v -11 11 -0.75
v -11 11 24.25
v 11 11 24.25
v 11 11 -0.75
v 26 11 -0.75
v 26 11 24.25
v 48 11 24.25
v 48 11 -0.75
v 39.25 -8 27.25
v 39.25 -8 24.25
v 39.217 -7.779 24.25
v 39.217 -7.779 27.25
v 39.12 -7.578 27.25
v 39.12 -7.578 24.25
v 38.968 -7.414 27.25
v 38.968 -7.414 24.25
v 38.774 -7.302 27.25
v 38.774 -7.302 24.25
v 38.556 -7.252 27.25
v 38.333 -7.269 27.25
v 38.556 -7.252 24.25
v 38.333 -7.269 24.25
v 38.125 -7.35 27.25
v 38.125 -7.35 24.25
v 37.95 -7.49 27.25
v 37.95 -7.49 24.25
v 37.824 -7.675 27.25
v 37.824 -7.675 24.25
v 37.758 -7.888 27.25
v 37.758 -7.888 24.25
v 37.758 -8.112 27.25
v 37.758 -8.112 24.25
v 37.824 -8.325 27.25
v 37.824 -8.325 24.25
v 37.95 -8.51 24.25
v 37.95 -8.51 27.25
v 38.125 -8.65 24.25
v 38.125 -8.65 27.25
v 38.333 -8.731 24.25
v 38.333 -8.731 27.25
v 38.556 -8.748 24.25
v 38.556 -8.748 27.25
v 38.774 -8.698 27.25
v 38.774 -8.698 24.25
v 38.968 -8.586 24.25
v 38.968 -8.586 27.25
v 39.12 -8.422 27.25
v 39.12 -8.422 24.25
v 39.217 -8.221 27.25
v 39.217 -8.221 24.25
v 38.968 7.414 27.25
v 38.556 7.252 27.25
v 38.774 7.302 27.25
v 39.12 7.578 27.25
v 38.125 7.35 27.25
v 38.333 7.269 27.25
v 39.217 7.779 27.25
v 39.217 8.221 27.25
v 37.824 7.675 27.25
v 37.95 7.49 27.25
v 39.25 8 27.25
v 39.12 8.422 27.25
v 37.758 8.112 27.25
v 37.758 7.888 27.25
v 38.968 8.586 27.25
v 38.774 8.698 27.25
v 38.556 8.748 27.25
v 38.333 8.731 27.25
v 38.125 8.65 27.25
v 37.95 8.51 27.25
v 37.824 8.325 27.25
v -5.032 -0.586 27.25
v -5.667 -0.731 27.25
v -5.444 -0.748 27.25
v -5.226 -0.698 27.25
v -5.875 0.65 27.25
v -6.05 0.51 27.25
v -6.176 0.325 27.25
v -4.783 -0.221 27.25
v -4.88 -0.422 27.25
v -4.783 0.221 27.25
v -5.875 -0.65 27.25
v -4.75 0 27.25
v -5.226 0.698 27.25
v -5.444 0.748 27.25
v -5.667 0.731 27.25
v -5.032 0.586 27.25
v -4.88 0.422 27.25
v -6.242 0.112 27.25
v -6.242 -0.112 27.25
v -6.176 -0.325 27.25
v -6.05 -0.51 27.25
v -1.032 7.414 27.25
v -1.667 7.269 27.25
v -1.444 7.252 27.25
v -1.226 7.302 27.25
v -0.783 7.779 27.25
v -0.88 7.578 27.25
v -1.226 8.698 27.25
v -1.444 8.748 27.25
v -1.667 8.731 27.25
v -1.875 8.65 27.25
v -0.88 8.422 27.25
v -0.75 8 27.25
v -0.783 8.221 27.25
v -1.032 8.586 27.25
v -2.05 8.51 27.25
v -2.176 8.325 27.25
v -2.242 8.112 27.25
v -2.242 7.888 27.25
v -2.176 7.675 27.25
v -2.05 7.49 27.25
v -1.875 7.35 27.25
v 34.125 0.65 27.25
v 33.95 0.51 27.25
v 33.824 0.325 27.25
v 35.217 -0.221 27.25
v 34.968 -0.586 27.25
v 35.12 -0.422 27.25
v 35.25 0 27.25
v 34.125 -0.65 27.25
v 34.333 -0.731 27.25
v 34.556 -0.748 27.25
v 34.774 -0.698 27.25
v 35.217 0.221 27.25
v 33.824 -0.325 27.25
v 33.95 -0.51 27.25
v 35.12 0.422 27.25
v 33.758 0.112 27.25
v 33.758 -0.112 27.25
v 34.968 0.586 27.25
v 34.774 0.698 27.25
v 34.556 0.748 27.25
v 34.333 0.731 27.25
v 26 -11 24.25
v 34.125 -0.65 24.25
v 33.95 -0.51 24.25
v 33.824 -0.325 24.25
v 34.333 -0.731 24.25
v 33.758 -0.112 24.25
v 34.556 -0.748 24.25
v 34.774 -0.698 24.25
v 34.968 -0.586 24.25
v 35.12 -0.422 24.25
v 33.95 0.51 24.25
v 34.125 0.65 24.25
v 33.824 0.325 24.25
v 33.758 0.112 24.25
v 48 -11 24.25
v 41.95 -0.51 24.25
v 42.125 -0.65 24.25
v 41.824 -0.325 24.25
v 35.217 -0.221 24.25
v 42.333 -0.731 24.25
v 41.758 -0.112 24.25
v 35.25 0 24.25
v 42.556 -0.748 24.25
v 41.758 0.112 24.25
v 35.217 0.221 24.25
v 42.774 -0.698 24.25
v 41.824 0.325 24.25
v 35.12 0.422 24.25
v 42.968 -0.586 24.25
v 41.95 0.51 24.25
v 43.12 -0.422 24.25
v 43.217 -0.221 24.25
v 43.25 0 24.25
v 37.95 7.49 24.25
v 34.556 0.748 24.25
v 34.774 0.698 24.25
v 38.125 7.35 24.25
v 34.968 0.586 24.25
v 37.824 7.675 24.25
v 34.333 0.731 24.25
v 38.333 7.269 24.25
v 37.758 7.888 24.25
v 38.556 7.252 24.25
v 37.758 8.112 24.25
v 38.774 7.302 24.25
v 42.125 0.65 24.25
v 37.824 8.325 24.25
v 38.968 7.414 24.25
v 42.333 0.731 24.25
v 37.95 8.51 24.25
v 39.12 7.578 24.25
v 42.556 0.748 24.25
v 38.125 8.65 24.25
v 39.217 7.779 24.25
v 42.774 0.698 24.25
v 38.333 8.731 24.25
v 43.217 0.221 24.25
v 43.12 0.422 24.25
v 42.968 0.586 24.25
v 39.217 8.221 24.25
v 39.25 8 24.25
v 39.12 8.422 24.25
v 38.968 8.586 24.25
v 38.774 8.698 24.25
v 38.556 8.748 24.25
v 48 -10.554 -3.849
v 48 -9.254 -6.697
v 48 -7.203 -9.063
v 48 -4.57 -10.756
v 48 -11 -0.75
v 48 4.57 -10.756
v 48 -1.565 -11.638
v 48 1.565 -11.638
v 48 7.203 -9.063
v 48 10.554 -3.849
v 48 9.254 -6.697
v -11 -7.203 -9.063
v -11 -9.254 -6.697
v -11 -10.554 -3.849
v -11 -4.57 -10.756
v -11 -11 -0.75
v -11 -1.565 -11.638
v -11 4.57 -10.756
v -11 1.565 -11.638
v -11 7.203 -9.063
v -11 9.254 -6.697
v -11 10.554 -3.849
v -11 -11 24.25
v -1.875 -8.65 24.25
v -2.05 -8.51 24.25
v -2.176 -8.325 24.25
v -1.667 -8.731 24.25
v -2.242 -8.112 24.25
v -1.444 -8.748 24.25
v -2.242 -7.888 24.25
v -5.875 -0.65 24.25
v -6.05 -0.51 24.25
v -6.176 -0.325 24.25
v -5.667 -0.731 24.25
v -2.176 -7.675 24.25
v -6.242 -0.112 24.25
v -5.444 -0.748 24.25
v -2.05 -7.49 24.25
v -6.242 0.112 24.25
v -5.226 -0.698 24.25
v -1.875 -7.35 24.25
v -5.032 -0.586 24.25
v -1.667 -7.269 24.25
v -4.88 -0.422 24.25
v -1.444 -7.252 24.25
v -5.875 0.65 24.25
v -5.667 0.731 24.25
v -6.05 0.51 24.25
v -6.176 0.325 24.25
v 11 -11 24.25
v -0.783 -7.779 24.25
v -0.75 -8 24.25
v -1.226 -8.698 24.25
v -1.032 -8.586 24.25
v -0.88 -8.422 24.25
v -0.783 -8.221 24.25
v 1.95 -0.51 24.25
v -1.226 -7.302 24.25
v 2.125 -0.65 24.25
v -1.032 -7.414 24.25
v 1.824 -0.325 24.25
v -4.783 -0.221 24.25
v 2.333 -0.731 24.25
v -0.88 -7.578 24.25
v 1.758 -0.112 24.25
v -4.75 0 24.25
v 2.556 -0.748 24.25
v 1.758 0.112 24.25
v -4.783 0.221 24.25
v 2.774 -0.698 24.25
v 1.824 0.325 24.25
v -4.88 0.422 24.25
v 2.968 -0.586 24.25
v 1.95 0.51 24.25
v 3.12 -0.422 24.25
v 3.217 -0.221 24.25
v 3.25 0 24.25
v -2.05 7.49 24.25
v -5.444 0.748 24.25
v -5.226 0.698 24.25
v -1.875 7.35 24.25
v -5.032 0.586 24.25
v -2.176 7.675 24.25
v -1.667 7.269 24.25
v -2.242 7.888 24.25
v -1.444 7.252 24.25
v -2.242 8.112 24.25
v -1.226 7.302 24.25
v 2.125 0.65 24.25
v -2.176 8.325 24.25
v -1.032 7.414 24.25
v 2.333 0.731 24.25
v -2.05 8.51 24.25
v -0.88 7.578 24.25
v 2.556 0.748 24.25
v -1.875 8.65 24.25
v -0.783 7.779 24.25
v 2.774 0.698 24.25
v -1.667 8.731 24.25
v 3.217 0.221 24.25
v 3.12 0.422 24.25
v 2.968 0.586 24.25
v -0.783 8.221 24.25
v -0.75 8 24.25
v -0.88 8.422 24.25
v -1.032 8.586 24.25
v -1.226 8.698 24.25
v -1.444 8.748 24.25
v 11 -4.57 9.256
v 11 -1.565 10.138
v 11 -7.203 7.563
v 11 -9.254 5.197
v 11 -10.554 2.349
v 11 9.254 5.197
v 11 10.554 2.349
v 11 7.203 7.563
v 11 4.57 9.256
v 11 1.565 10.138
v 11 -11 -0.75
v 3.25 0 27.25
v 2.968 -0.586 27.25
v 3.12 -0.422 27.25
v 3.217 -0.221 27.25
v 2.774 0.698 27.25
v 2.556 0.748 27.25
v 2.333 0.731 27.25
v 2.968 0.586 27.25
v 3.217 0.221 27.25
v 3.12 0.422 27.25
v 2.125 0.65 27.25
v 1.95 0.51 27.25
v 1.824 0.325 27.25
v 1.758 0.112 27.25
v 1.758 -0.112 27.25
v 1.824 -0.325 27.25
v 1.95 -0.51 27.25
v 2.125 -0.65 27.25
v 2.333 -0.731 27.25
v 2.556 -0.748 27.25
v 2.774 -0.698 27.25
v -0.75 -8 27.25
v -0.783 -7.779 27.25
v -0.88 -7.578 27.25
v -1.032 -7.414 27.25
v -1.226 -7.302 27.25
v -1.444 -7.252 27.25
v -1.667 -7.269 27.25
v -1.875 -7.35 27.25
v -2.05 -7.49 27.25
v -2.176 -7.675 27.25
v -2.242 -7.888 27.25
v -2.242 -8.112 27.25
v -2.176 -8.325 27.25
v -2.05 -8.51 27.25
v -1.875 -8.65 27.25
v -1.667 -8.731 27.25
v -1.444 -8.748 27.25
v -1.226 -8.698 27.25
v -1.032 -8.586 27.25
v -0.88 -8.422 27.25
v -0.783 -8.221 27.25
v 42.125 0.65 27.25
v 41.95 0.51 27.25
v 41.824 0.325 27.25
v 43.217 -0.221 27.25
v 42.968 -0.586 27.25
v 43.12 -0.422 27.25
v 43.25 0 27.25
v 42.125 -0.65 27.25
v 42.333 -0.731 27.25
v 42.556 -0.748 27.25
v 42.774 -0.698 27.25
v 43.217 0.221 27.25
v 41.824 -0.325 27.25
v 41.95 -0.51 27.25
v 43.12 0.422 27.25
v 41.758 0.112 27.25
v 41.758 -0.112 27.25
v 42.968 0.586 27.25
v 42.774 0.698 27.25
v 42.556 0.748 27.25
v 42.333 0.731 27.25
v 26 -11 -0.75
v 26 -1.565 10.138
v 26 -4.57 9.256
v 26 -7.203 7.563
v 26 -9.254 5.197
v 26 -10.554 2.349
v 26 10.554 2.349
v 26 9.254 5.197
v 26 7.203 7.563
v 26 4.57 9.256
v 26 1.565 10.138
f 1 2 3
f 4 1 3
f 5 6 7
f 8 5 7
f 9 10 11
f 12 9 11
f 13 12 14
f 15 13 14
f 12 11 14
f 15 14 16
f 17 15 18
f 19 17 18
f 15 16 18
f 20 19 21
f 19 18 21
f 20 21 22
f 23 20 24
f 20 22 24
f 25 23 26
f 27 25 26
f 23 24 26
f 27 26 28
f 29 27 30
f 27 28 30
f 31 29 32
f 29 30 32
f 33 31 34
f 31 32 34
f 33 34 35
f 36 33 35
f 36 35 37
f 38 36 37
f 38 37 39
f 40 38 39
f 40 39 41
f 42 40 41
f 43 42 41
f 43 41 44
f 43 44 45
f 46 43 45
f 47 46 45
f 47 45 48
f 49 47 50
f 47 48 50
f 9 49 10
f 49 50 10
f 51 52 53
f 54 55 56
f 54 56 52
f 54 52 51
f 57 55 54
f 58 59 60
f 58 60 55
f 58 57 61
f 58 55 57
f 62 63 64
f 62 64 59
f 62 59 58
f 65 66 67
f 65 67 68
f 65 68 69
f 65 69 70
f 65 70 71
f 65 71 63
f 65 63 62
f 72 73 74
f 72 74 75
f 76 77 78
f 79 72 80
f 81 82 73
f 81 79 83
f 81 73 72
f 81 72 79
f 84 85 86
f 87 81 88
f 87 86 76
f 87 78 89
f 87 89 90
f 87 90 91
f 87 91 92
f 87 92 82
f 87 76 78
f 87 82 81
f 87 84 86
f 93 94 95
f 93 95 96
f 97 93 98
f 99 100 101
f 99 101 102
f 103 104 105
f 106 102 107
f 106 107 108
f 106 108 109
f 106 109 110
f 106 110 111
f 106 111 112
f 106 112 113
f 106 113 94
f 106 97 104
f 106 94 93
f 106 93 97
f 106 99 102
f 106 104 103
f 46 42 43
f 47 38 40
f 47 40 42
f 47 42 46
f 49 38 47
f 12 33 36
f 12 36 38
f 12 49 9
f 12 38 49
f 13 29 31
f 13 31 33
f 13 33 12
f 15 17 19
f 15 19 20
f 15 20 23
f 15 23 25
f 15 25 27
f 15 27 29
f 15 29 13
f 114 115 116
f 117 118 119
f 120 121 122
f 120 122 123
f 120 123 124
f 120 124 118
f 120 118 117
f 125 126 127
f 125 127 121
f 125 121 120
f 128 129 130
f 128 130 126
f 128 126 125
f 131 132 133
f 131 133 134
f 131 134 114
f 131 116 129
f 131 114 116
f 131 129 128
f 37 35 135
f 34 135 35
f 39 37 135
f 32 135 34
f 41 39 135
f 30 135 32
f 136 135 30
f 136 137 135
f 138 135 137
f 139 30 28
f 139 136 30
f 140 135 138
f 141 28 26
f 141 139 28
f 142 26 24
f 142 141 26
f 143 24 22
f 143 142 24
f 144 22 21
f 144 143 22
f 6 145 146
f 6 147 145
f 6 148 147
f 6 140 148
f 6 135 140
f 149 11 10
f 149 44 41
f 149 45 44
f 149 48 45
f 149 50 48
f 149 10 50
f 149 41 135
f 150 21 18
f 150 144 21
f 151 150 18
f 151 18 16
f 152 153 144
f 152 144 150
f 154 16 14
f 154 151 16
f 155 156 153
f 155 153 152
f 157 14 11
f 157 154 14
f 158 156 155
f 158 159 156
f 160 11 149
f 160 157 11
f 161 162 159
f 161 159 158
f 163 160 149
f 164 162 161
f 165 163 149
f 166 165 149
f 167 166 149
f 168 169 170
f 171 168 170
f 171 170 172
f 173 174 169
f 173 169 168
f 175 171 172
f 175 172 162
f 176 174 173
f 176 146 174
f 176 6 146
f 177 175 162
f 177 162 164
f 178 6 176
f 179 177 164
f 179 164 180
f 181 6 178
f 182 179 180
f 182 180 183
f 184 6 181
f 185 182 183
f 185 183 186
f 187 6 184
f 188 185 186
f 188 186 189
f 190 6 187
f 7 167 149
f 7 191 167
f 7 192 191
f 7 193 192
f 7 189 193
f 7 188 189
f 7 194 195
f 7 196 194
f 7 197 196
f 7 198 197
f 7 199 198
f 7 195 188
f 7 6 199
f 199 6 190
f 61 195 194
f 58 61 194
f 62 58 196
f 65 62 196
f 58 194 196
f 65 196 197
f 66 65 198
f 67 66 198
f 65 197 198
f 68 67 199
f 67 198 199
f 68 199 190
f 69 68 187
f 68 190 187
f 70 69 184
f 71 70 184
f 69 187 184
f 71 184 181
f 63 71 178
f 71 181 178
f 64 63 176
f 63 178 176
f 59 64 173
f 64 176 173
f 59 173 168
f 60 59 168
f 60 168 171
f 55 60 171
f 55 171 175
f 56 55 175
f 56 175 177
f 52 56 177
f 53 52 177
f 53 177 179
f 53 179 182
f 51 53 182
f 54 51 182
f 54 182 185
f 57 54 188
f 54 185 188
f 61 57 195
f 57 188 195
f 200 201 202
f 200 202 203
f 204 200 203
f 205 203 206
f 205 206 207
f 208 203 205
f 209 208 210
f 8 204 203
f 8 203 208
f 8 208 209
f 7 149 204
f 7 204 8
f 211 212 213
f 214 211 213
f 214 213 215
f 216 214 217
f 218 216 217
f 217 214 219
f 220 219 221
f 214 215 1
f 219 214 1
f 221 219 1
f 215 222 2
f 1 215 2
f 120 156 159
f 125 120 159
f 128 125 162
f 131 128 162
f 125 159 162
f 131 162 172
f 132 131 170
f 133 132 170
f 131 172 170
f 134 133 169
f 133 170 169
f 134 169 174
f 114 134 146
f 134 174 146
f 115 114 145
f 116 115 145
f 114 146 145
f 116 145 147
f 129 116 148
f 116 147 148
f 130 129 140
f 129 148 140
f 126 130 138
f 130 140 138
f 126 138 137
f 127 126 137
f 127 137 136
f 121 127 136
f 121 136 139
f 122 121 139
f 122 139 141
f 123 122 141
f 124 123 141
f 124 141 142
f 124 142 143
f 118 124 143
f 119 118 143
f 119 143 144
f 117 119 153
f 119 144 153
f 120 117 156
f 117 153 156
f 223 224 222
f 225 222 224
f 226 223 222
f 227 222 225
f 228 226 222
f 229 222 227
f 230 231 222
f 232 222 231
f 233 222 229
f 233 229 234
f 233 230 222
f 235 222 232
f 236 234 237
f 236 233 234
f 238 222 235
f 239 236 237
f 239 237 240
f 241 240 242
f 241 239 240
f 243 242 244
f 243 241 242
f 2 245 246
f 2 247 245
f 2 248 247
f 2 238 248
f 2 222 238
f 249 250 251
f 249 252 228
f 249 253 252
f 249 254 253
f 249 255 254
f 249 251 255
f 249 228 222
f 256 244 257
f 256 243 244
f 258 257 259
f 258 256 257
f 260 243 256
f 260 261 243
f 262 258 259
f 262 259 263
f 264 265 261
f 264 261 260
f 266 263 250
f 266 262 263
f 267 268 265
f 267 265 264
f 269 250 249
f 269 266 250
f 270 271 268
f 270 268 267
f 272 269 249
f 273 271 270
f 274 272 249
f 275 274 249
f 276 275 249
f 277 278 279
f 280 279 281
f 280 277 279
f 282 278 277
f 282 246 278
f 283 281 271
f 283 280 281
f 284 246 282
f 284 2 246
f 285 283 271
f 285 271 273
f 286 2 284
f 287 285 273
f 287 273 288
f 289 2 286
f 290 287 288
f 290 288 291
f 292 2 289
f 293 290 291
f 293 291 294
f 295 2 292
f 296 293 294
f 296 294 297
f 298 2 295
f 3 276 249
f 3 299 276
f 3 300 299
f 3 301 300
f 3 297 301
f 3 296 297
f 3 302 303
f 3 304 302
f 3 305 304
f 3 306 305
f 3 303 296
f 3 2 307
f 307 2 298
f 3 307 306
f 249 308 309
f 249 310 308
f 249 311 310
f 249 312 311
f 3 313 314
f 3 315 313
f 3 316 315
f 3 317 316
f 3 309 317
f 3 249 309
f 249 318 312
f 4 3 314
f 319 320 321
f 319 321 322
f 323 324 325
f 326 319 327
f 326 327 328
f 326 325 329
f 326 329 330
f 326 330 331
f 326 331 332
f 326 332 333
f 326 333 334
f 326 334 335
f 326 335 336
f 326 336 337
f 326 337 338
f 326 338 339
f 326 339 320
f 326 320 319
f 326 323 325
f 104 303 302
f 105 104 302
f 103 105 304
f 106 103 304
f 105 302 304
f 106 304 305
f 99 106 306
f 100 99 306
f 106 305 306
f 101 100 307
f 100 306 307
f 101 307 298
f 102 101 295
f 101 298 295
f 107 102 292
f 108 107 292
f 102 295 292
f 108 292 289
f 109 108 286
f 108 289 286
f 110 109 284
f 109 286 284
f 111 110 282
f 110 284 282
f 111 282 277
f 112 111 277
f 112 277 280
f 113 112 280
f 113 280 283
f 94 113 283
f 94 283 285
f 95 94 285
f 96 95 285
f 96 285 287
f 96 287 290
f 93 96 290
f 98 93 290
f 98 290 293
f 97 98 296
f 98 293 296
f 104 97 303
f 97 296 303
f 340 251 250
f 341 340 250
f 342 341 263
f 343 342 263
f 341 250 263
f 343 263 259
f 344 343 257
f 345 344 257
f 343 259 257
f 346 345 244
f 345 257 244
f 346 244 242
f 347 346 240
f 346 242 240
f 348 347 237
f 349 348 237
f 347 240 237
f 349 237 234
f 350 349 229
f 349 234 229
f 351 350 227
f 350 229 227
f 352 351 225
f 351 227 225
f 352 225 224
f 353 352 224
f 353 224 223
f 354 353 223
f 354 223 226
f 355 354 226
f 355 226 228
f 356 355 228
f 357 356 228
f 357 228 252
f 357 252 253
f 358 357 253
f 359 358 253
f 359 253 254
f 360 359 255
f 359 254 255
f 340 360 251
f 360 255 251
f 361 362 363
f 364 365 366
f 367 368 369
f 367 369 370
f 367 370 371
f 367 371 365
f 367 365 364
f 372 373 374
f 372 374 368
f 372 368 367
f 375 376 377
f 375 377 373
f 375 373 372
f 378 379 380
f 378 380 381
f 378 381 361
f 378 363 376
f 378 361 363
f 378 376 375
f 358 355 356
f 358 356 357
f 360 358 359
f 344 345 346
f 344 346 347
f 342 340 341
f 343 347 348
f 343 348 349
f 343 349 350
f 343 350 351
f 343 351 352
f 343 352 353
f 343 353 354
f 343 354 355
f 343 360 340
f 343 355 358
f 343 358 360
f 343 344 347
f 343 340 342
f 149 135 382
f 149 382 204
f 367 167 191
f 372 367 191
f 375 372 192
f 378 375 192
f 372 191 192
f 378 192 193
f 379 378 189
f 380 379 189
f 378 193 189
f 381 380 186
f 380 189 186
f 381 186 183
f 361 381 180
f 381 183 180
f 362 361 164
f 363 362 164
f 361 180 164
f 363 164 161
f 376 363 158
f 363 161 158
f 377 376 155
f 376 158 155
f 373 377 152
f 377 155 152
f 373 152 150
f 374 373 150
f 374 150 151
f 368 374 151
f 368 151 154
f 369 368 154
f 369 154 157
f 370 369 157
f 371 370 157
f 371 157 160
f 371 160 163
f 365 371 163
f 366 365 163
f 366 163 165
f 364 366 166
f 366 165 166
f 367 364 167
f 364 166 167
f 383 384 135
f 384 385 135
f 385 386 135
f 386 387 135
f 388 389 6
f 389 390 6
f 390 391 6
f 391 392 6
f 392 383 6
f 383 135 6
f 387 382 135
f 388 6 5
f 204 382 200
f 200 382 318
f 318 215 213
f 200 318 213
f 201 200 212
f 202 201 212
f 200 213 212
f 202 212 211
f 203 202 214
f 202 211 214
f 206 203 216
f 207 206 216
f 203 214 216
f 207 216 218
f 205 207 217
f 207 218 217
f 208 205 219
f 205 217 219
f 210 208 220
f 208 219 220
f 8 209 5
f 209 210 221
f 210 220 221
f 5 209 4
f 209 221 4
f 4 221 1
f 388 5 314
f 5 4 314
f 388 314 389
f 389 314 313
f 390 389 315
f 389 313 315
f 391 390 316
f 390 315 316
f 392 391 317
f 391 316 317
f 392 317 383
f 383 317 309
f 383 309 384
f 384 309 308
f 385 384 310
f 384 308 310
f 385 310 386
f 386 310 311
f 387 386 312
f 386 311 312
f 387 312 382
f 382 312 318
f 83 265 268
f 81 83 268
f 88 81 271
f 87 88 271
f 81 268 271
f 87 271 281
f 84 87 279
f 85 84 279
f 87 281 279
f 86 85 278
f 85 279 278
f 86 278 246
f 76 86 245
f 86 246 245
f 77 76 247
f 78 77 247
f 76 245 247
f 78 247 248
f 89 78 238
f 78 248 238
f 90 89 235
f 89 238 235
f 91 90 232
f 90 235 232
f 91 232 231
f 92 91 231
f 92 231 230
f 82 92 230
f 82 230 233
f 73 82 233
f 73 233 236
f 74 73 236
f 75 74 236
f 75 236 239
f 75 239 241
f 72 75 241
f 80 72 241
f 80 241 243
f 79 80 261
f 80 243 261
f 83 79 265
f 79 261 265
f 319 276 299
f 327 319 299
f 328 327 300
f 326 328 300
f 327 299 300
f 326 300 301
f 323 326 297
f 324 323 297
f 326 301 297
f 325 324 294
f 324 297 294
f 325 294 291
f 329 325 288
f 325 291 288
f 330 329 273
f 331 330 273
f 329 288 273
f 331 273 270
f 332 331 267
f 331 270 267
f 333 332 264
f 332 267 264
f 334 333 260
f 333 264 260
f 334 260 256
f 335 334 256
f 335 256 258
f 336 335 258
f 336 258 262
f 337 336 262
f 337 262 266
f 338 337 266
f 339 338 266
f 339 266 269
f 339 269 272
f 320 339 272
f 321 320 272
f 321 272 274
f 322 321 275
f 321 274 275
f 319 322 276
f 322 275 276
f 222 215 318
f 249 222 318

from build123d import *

# Parameters (mm, degrees)
ESBO_O1_W                  = 22
ESBO_O1_H                  = 22
RESSALTO_EXTRUS_O1_DEPTH   = 24.25
RESSALTO_EXTRUS_O1_2_DEPTH = 24.25
ESBO_O2_R                  = 11
RESSALTO_EXTRUS_O2_DEPTH   = 15
CORTE_EXTRUS_O1_DEPTH      = 65.730692102
CORTE_EXTRUS_O1_DEPTH_BACK = 65.730692102
ESBO_O4_R                  = 0.75
RESSALTO_EXTRUS_O3_DEPTH   = 3


with BuildPart() as part:
    # Esboço1 → Ressalto-extrusão1 (new, symmetric)
    with BuildSketch(Plane.XY):
        Rectangle(ESBO_O1_W, ESBO_O1_H)
    extrude(amount=RESSALTO_EXTRUS_O1_DEPTH, both=True)



with BuildPart() as body_2:
    # Esboço1 → Ressalto-extrus_o1 2 (new, symmetric)
    with BuildSketch(Plane.XY):
        with Locations((37, 0)):
            Rectangle(ESBO_O1_W, ESBO_O1_H)
    extrude(amount=RESSALTO_EXTRUS_O1_2_DEPTH, both=True)


with BuildPart() as part_1:
    add(part.part)

    add(body_2.part)  # Ressalto-extrusão2 merges body 2
    # Esboço2 → Ressalto-extrusão2 (add)
    with BuildSketch(Plane(origin=(11, 0, 0), x_dir=(0, 0, -1), z_dir=(1, 0, 0))):
        with Locations(Location((0.75, 0, 0), (0, 0, 270))):
            Circle(ESBO_O2_R)
    extrude(amount=RESSALTO_EXTRUS_O2_DEPTH)

    # Esboço3 → Corte-extrusão1 (cut, two sides)
    with BuildSketch(Plane(origin=(48, 0, 0), x_dir=(0, 0, -1), z_dir=(1, 0, 0))) as corte_extrus_o1_sk:
        with BuildLine():
            Line((0.75, 11), (24.25, 11))
            Line((24.25, 11), (24.25, -11))
            Line((24.25, -11), (0.75, -11))
            ThreePointArc((0.75, -11), (11.75, 0), (0.75, 11))
        make_face()
    extrude(amount=CORTE_EXTRUS_O1_DEPTH, mode=Mode.SUBTRACT)
    extrude(corte_extrus_o1_sk.sketch, amount=-CORTE_EXTRUS_O1_DEPTH_BACK, mode=Mode.SUBTRACT)

    # Esboço4 → Ressalto-extrusão3 (add)
    with BuildSketch(Plane.XY.offset(24.25)):
        with Locations((-5.5, 0)):
            Circle(ESBO_O4_R)
        with Locations((2.5, 0)):
            Circle(ESBO_O4_R)
        with Locations((-1.5, 8)):
            Circle(ESBO_O4_R)
        with Locations((-1.5, -8)):
            Circle(ESBO_O4_R)
        with Locations((34.5, 0)):
            Circle(ESBO_O4_R)
        with Locations((42.5, 0)):
            Circle(ESBO_O4_R)
        with Locations((38.5, -8)):
            Circle(ESBO_O4_R)
        with Locations((38.5, 8)):
            Circle(ESBO_O4_R)
    extrude(amount=RESSALTO_EXTRUS_O3_DEPTH)


solid = part_1.part
